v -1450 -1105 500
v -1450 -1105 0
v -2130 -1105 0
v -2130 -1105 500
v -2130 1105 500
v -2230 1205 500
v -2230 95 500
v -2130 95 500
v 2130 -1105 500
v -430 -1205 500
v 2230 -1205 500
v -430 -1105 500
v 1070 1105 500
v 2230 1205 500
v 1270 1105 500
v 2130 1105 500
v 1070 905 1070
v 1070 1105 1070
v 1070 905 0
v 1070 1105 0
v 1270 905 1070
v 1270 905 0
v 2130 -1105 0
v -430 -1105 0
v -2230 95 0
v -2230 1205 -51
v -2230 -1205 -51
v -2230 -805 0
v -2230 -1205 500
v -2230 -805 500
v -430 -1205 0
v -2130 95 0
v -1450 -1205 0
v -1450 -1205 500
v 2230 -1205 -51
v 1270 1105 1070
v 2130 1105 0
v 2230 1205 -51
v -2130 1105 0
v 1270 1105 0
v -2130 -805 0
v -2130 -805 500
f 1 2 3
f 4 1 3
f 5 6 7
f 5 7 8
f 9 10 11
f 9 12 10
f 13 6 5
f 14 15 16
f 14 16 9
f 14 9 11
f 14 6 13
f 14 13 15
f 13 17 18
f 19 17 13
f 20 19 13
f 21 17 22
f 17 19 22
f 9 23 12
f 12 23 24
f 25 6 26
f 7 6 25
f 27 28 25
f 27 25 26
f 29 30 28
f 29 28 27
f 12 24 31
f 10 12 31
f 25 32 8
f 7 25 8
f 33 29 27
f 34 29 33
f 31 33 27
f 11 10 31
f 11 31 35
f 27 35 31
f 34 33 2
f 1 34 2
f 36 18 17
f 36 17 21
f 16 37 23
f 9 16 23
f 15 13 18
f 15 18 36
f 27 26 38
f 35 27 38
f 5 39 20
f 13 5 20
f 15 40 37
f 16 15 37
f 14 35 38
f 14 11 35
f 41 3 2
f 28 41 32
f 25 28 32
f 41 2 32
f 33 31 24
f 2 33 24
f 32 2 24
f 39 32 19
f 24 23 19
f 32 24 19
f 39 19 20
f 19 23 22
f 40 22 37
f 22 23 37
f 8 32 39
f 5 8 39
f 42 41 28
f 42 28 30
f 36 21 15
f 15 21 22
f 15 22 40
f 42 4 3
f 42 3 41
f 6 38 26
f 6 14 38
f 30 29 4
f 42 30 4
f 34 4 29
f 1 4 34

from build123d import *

# Parameters (mm, degrees)
F1_DEPTH = 500
F2_DEPTH = 51
F3_W     = 900
F3_H     = 500
F4_DEPTH = 190
F5_W     = 200
F5_H     = 200
F6_DEPTH = 570


with BuildPart() as f1:
    # F0 (on Top) → F1 (new body)
    with BuildSketch(Plane.XY):
        Polygon((2230, 1205), (-2230, 1205), (-2230, -1205), (-1450, -1205), (-1450, -1105), (-2130, -1105), (-2130, 1105), (1070, 1105), (1070, 905), (1270, 905), (1270, 1105), (2130, 1105), (2130, -1105), (-430, -1105), (-430, -1205), (2230, -1205), align=None)
    extrude(amount=F1_DEPTH)

    # F0 (on Top) → F2 (join)
    with BuildSketch(Plane.XY):
        Polygon((2230, 1205), (-2230, 1205), (-2230, -1205), (-1450, -1205), (-1450, -1105), (-2130, -1105), (-2130, 1105), (1070, 1105), (1070, 905), (1270, 905), (1270, 1105), (2130, 1105), (2130, -1105), (-430, -1105), (-430, -1205), (2230, -1205), align=None)
        Polygon((-1450, -1105), (-1450, -1205), (-430, -1205), (-430, -1105), (2130, -1105), (2130, 1105), (1270, 1105), (1270, 905), (1070, 905), (1070, 1105), (-2130, 1105), (-2130, -1105), align=None)
    extrude(amount=-F2_DEPTH)

    # F3 (on face) → F4 (cut)
    with BuildSketch(Plane.YZ.offset(-2130)):
        with Locations((-355, 250)):
            Rectangle(F3_W, F3_H)
    extrude(amount=-F4_DEPTH, mode=Mode.SUBTRACT)

    # F5 (on face) → F6 (join)
    with BuildSketch(Plane.XY.offset(500)):
        with Locations((1170, 1005)):
            Rectangle(F5_W, F5_H)
    extrude(amount=F6_DEPTH)


solid = f1.part
